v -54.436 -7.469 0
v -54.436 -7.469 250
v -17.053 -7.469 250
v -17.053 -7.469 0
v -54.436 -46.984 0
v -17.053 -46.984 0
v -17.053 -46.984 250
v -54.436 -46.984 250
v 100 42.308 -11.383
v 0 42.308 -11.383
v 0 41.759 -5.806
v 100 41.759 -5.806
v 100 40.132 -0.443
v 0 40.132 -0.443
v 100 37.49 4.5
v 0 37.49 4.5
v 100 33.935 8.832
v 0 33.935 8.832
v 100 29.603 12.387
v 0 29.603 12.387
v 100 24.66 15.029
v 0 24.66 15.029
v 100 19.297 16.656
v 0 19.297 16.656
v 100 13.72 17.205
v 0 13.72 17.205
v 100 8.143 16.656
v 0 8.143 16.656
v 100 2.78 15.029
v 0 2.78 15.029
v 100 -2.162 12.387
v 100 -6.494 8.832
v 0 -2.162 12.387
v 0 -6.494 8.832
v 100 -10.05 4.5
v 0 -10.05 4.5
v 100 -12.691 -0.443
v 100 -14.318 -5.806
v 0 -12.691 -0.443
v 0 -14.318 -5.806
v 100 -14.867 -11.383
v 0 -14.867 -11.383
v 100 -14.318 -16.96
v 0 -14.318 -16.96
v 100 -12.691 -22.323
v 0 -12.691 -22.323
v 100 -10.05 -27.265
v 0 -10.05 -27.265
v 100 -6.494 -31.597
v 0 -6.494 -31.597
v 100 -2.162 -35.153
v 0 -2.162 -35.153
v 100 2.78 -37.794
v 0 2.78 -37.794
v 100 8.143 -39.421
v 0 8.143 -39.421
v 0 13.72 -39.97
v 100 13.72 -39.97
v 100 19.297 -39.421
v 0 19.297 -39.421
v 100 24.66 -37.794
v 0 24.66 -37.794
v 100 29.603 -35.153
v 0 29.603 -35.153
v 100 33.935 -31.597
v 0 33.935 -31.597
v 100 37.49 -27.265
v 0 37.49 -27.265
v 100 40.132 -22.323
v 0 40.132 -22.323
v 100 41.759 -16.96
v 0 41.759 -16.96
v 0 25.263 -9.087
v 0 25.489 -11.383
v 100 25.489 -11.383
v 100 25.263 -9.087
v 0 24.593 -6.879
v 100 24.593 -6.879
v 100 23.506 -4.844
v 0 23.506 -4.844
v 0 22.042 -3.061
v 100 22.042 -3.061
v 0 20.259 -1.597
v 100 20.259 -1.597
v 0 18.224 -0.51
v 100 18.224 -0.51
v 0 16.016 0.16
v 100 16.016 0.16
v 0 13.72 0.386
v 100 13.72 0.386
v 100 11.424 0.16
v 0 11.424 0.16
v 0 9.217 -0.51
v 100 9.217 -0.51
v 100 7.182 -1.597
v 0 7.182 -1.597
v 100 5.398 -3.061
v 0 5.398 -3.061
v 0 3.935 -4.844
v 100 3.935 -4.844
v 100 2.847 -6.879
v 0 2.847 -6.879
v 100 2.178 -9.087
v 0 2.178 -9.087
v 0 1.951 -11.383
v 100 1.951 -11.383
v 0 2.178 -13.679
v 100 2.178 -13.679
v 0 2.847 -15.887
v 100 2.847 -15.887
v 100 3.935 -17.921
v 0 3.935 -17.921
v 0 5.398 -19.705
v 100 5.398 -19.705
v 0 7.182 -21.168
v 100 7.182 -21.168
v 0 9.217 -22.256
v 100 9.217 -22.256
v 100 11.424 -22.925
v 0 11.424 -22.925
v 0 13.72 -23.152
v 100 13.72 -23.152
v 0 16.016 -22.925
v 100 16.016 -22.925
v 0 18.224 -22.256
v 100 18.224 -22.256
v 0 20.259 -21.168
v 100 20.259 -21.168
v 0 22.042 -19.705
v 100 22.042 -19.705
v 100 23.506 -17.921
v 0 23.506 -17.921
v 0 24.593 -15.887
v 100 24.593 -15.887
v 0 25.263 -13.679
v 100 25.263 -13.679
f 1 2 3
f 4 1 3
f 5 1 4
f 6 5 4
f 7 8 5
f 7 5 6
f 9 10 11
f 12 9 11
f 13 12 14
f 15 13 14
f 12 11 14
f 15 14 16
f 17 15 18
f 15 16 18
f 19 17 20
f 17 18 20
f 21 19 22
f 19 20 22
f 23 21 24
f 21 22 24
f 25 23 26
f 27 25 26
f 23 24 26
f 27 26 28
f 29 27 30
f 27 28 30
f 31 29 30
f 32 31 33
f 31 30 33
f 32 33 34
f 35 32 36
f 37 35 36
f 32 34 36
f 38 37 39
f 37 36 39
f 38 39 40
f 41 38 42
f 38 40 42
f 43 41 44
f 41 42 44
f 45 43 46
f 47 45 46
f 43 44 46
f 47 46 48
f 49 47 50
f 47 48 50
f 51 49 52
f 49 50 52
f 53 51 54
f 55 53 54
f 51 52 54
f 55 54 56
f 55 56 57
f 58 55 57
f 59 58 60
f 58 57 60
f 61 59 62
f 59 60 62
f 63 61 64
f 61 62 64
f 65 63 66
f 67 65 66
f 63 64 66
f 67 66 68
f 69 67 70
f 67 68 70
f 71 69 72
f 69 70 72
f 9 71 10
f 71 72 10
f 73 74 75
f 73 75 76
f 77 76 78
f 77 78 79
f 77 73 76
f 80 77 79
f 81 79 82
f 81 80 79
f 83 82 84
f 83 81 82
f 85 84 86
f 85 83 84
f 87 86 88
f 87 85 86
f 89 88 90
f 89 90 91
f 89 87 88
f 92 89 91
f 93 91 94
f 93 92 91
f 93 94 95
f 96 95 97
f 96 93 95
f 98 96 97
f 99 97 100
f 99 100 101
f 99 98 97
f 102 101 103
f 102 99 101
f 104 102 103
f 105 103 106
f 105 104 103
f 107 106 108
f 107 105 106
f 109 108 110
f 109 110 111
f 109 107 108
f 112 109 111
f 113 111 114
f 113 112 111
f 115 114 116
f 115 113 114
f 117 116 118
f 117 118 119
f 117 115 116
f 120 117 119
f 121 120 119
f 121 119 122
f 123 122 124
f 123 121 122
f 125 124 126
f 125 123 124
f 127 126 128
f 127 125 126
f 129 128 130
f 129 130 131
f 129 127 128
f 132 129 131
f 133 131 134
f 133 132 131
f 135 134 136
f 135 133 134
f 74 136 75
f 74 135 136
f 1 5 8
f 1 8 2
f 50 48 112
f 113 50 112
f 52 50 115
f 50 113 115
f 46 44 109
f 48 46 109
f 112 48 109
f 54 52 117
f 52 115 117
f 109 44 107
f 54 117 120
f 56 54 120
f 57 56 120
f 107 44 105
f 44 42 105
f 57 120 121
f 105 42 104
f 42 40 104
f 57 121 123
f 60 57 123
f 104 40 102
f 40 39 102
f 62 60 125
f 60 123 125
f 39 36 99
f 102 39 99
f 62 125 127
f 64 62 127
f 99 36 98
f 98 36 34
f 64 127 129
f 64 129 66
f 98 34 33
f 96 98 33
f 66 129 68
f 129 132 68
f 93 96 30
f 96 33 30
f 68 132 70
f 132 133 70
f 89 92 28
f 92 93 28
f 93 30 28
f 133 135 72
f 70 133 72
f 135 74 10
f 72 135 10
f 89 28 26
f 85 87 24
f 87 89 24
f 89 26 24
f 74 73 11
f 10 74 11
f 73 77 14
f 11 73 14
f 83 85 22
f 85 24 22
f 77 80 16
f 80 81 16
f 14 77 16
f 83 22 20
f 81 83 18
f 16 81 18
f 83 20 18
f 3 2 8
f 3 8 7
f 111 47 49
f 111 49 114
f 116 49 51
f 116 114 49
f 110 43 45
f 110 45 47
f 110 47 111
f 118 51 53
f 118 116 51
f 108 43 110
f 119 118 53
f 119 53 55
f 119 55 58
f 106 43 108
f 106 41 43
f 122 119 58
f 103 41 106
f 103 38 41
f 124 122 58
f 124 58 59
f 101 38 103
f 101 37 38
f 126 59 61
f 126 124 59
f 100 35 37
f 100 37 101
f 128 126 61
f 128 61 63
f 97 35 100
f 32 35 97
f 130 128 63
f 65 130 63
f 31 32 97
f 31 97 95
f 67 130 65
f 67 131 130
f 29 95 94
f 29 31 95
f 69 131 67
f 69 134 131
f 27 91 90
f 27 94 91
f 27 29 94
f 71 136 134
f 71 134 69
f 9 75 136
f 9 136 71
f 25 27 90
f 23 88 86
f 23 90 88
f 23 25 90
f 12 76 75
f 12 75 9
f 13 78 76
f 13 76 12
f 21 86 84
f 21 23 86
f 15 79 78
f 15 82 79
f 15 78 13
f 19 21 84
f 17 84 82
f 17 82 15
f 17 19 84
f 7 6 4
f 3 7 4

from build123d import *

# Parameters (mm, degrees)
F1_R     = 28.587714
F1_R_2   = 11.768885
F2_DEPTH = 100
F0_W     = 37.383769
F0_H     = 39.515132
F3_DEPTH = 250


with BuildPart() as f2:
    # F1 (on Right) → F2 (new body)
    with BuildSketch(Plane.YZ):
        with Locations((13.720259, -11.382747)):
            Circle(F1_R)
        with Locations((13.720259, -11.382747)):
            Circle(F1_R_2, mode=Mode.SUBTRACT)
    extrude(amount=F2_DEPTH)


with BuildPart() as f3:
    # F0 (on Top) → F3 (new body)
    with BuildSketch(Plane.XY):
        with Locations((-35.744512, -27.226753)):
            Rectangle(F0_W, F0_H)
    extrude(amount=F3_DEPTH)


solid = Compound([f2.part, f3.part])
